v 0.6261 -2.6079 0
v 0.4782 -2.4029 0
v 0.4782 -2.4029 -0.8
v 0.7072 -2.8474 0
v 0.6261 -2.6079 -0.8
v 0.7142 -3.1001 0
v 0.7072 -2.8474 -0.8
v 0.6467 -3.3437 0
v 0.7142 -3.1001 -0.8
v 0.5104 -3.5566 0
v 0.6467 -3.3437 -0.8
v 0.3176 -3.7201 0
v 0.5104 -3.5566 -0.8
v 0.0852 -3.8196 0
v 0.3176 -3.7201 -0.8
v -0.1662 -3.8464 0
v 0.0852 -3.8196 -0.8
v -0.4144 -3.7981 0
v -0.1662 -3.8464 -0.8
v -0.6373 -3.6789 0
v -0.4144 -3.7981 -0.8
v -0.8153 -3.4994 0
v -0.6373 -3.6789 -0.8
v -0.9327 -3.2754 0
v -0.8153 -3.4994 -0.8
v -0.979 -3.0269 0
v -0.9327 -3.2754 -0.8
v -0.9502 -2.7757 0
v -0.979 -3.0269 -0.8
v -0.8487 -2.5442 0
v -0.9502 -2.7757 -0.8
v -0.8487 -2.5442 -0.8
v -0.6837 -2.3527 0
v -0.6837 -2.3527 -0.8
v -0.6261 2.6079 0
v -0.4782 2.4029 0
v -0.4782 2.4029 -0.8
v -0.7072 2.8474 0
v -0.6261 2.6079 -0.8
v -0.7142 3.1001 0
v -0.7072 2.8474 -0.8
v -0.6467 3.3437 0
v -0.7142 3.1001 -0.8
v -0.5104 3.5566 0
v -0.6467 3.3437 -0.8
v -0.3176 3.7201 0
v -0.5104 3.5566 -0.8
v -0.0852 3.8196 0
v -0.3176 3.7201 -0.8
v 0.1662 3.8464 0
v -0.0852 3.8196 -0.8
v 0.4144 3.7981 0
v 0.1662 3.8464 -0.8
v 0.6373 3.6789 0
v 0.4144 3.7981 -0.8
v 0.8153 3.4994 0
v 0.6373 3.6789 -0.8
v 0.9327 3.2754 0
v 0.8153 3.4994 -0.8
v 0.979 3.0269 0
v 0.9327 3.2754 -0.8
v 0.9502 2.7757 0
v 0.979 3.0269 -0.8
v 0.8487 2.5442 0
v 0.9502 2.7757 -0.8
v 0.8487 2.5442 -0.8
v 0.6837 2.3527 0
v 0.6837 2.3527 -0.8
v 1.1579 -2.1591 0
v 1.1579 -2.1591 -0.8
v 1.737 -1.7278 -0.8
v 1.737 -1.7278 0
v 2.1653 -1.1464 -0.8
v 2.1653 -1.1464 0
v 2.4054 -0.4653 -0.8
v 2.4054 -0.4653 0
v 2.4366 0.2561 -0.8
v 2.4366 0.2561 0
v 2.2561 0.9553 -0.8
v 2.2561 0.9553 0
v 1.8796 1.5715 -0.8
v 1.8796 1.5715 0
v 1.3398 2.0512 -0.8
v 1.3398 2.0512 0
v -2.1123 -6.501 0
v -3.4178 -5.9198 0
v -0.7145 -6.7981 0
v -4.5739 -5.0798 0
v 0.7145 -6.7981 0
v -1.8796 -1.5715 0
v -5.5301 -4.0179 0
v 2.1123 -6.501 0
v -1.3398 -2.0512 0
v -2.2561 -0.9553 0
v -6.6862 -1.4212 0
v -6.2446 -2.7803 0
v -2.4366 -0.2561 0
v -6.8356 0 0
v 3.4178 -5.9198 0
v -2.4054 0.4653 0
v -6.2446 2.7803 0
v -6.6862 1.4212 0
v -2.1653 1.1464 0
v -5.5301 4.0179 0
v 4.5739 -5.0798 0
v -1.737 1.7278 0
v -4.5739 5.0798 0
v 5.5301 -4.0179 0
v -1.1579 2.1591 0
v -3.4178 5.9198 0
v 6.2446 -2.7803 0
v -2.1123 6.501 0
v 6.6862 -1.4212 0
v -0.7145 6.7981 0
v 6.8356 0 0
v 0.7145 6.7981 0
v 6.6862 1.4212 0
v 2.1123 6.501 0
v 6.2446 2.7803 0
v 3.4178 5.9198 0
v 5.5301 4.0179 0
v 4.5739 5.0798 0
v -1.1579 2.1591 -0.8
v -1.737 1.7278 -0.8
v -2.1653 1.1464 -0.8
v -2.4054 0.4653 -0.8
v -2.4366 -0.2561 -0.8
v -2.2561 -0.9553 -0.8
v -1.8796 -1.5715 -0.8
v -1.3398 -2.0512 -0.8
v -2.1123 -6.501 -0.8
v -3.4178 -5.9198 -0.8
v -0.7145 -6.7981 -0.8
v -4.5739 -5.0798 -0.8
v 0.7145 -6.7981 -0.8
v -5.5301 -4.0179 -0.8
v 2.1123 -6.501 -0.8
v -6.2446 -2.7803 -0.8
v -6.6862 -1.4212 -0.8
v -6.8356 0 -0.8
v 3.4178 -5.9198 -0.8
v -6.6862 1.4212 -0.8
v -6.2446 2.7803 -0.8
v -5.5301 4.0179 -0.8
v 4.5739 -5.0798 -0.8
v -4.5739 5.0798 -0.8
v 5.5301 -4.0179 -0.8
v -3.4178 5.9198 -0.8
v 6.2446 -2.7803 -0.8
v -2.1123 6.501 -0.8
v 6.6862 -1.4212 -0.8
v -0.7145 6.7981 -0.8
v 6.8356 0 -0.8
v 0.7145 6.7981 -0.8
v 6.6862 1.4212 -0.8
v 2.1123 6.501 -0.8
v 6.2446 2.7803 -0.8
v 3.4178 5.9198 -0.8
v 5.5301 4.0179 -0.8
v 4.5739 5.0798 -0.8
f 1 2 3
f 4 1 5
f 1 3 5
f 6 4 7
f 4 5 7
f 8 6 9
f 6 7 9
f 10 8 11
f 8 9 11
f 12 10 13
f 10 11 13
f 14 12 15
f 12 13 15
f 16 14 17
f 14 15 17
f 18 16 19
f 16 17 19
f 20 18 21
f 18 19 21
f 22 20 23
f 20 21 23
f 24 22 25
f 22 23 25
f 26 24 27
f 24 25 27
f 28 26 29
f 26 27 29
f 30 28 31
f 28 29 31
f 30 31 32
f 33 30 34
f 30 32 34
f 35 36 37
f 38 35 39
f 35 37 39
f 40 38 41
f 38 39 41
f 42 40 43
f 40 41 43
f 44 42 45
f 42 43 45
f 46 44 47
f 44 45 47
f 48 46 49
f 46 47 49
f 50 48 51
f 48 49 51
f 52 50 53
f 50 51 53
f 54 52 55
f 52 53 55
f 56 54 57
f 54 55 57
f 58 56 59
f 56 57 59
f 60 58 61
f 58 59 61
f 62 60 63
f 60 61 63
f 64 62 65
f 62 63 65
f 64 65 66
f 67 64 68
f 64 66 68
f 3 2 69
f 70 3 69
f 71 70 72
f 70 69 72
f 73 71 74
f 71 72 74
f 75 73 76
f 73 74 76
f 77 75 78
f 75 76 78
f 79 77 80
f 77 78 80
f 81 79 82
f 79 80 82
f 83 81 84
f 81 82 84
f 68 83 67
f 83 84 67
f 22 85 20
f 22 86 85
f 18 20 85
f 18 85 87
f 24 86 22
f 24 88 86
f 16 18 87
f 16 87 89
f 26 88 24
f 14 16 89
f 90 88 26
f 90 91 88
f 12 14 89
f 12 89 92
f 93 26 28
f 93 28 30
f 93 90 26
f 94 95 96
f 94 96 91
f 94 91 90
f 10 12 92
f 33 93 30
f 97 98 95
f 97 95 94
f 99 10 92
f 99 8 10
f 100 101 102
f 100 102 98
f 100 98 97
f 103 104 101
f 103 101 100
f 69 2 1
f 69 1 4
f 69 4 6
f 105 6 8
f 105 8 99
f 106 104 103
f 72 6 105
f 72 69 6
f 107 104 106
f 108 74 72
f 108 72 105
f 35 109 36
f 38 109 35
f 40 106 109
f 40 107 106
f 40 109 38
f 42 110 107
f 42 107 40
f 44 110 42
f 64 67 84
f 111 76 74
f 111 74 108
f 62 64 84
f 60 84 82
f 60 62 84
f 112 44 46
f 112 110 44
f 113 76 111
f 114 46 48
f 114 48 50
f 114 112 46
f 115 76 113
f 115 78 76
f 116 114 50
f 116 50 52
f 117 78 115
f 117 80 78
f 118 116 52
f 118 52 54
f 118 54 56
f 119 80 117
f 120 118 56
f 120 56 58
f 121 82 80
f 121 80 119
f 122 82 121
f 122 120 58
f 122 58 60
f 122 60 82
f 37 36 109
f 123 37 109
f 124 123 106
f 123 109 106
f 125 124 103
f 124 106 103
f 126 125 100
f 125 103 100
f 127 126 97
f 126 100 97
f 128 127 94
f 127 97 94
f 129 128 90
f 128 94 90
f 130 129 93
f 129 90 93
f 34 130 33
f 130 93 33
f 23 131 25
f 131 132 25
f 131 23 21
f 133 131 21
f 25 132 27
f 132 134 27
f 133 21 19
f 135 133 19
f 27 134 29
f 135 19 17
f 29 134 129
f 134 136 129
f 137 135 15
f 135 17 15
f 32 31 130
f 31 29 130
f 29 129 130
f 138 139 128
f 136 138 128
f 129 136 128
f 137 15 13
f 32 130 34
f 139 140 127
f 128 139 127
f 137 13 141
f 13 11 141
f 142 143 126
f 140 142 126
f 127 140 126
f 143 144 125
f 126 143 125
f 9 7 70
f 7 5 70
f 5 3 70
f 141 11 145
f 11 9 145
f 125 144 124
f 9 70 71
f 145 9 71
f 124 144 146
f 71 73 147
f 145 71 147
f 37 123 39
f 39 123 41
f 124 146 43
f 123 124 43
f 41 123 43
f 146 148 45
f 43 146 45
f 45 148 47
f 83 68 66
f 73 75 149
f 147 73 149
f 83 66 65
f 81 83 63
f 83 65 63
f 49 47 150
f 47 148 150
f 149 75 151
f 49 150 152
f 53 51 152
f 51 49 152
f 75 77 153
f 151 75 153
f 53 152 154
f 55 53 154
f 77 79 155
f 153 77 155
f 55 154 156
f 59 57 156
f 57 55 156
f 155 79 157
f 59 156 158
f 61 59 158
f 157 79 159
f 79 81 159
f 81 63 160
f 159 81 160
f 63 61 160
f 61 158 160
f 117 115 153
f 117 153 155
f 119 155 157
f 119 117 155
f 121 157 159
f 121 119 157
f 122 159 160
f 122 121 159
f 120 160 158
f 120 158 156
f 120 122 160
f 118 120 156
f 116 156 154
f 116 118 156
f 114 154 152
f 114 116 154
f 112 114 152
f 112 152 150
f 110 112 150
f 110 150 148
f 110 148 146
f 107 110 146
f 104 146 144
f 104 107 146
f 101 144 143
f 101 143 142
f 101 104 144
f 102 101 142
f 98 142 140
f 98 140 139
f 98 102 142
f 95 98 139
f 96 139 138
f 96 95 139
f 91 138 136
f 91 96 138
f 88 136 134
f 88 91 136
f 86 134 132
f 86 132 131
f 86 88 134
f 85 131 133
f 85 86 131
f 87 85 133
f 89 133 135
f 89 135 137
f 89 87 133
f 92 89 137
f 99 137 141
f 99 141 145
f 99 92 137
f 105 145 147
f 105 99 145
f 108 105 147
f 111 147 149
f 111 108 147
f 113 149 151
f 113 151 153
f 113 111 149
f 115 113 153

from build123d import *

# Parameters (mm, degrees)
ESQUISSE1_R             = 6.835577951
ESQUISSE1_R_2           = 2.45
BOSS_EXTRU_1_DEPTH      = 0.8
ESQUISSE3_R             = 0.85
ENL_V_MAT_EXTRU_1_DEPTH = 10.700012982


with BuildPart() as part:
    # Esquisse1 → Boss.-Extru.1 (new body)
    with BuildSketch(Plane.XY):
        Circle(ESQUISSE1_R)
        Circle(ESQUISSE1_R_2, mode=Mode.SUBTRACT)
    extrude(amount=-BOSS_EXTRU_1_DEPTH)

    # Esquisse3 → Enlèv. mat.-Extru.1 (cut, through all)
    with BuildSketch(Plane(origin=(0, 0, -0.8), x_dir=(-1, 0, 0), z_dir=(0, 0, -1))):
        with Locations((-0.129516777, 2.99720293)):
            Circle(ESQUISSE3_R)
        with Locations((0.129516777, -2.99720293)):
            Circle(ESQUISSE3_R)
    extrude(amount=-ENL_V_MAT_EXTRU_1_DEPTH, mode=Mode.SUBTRACT)


solid = part.part
